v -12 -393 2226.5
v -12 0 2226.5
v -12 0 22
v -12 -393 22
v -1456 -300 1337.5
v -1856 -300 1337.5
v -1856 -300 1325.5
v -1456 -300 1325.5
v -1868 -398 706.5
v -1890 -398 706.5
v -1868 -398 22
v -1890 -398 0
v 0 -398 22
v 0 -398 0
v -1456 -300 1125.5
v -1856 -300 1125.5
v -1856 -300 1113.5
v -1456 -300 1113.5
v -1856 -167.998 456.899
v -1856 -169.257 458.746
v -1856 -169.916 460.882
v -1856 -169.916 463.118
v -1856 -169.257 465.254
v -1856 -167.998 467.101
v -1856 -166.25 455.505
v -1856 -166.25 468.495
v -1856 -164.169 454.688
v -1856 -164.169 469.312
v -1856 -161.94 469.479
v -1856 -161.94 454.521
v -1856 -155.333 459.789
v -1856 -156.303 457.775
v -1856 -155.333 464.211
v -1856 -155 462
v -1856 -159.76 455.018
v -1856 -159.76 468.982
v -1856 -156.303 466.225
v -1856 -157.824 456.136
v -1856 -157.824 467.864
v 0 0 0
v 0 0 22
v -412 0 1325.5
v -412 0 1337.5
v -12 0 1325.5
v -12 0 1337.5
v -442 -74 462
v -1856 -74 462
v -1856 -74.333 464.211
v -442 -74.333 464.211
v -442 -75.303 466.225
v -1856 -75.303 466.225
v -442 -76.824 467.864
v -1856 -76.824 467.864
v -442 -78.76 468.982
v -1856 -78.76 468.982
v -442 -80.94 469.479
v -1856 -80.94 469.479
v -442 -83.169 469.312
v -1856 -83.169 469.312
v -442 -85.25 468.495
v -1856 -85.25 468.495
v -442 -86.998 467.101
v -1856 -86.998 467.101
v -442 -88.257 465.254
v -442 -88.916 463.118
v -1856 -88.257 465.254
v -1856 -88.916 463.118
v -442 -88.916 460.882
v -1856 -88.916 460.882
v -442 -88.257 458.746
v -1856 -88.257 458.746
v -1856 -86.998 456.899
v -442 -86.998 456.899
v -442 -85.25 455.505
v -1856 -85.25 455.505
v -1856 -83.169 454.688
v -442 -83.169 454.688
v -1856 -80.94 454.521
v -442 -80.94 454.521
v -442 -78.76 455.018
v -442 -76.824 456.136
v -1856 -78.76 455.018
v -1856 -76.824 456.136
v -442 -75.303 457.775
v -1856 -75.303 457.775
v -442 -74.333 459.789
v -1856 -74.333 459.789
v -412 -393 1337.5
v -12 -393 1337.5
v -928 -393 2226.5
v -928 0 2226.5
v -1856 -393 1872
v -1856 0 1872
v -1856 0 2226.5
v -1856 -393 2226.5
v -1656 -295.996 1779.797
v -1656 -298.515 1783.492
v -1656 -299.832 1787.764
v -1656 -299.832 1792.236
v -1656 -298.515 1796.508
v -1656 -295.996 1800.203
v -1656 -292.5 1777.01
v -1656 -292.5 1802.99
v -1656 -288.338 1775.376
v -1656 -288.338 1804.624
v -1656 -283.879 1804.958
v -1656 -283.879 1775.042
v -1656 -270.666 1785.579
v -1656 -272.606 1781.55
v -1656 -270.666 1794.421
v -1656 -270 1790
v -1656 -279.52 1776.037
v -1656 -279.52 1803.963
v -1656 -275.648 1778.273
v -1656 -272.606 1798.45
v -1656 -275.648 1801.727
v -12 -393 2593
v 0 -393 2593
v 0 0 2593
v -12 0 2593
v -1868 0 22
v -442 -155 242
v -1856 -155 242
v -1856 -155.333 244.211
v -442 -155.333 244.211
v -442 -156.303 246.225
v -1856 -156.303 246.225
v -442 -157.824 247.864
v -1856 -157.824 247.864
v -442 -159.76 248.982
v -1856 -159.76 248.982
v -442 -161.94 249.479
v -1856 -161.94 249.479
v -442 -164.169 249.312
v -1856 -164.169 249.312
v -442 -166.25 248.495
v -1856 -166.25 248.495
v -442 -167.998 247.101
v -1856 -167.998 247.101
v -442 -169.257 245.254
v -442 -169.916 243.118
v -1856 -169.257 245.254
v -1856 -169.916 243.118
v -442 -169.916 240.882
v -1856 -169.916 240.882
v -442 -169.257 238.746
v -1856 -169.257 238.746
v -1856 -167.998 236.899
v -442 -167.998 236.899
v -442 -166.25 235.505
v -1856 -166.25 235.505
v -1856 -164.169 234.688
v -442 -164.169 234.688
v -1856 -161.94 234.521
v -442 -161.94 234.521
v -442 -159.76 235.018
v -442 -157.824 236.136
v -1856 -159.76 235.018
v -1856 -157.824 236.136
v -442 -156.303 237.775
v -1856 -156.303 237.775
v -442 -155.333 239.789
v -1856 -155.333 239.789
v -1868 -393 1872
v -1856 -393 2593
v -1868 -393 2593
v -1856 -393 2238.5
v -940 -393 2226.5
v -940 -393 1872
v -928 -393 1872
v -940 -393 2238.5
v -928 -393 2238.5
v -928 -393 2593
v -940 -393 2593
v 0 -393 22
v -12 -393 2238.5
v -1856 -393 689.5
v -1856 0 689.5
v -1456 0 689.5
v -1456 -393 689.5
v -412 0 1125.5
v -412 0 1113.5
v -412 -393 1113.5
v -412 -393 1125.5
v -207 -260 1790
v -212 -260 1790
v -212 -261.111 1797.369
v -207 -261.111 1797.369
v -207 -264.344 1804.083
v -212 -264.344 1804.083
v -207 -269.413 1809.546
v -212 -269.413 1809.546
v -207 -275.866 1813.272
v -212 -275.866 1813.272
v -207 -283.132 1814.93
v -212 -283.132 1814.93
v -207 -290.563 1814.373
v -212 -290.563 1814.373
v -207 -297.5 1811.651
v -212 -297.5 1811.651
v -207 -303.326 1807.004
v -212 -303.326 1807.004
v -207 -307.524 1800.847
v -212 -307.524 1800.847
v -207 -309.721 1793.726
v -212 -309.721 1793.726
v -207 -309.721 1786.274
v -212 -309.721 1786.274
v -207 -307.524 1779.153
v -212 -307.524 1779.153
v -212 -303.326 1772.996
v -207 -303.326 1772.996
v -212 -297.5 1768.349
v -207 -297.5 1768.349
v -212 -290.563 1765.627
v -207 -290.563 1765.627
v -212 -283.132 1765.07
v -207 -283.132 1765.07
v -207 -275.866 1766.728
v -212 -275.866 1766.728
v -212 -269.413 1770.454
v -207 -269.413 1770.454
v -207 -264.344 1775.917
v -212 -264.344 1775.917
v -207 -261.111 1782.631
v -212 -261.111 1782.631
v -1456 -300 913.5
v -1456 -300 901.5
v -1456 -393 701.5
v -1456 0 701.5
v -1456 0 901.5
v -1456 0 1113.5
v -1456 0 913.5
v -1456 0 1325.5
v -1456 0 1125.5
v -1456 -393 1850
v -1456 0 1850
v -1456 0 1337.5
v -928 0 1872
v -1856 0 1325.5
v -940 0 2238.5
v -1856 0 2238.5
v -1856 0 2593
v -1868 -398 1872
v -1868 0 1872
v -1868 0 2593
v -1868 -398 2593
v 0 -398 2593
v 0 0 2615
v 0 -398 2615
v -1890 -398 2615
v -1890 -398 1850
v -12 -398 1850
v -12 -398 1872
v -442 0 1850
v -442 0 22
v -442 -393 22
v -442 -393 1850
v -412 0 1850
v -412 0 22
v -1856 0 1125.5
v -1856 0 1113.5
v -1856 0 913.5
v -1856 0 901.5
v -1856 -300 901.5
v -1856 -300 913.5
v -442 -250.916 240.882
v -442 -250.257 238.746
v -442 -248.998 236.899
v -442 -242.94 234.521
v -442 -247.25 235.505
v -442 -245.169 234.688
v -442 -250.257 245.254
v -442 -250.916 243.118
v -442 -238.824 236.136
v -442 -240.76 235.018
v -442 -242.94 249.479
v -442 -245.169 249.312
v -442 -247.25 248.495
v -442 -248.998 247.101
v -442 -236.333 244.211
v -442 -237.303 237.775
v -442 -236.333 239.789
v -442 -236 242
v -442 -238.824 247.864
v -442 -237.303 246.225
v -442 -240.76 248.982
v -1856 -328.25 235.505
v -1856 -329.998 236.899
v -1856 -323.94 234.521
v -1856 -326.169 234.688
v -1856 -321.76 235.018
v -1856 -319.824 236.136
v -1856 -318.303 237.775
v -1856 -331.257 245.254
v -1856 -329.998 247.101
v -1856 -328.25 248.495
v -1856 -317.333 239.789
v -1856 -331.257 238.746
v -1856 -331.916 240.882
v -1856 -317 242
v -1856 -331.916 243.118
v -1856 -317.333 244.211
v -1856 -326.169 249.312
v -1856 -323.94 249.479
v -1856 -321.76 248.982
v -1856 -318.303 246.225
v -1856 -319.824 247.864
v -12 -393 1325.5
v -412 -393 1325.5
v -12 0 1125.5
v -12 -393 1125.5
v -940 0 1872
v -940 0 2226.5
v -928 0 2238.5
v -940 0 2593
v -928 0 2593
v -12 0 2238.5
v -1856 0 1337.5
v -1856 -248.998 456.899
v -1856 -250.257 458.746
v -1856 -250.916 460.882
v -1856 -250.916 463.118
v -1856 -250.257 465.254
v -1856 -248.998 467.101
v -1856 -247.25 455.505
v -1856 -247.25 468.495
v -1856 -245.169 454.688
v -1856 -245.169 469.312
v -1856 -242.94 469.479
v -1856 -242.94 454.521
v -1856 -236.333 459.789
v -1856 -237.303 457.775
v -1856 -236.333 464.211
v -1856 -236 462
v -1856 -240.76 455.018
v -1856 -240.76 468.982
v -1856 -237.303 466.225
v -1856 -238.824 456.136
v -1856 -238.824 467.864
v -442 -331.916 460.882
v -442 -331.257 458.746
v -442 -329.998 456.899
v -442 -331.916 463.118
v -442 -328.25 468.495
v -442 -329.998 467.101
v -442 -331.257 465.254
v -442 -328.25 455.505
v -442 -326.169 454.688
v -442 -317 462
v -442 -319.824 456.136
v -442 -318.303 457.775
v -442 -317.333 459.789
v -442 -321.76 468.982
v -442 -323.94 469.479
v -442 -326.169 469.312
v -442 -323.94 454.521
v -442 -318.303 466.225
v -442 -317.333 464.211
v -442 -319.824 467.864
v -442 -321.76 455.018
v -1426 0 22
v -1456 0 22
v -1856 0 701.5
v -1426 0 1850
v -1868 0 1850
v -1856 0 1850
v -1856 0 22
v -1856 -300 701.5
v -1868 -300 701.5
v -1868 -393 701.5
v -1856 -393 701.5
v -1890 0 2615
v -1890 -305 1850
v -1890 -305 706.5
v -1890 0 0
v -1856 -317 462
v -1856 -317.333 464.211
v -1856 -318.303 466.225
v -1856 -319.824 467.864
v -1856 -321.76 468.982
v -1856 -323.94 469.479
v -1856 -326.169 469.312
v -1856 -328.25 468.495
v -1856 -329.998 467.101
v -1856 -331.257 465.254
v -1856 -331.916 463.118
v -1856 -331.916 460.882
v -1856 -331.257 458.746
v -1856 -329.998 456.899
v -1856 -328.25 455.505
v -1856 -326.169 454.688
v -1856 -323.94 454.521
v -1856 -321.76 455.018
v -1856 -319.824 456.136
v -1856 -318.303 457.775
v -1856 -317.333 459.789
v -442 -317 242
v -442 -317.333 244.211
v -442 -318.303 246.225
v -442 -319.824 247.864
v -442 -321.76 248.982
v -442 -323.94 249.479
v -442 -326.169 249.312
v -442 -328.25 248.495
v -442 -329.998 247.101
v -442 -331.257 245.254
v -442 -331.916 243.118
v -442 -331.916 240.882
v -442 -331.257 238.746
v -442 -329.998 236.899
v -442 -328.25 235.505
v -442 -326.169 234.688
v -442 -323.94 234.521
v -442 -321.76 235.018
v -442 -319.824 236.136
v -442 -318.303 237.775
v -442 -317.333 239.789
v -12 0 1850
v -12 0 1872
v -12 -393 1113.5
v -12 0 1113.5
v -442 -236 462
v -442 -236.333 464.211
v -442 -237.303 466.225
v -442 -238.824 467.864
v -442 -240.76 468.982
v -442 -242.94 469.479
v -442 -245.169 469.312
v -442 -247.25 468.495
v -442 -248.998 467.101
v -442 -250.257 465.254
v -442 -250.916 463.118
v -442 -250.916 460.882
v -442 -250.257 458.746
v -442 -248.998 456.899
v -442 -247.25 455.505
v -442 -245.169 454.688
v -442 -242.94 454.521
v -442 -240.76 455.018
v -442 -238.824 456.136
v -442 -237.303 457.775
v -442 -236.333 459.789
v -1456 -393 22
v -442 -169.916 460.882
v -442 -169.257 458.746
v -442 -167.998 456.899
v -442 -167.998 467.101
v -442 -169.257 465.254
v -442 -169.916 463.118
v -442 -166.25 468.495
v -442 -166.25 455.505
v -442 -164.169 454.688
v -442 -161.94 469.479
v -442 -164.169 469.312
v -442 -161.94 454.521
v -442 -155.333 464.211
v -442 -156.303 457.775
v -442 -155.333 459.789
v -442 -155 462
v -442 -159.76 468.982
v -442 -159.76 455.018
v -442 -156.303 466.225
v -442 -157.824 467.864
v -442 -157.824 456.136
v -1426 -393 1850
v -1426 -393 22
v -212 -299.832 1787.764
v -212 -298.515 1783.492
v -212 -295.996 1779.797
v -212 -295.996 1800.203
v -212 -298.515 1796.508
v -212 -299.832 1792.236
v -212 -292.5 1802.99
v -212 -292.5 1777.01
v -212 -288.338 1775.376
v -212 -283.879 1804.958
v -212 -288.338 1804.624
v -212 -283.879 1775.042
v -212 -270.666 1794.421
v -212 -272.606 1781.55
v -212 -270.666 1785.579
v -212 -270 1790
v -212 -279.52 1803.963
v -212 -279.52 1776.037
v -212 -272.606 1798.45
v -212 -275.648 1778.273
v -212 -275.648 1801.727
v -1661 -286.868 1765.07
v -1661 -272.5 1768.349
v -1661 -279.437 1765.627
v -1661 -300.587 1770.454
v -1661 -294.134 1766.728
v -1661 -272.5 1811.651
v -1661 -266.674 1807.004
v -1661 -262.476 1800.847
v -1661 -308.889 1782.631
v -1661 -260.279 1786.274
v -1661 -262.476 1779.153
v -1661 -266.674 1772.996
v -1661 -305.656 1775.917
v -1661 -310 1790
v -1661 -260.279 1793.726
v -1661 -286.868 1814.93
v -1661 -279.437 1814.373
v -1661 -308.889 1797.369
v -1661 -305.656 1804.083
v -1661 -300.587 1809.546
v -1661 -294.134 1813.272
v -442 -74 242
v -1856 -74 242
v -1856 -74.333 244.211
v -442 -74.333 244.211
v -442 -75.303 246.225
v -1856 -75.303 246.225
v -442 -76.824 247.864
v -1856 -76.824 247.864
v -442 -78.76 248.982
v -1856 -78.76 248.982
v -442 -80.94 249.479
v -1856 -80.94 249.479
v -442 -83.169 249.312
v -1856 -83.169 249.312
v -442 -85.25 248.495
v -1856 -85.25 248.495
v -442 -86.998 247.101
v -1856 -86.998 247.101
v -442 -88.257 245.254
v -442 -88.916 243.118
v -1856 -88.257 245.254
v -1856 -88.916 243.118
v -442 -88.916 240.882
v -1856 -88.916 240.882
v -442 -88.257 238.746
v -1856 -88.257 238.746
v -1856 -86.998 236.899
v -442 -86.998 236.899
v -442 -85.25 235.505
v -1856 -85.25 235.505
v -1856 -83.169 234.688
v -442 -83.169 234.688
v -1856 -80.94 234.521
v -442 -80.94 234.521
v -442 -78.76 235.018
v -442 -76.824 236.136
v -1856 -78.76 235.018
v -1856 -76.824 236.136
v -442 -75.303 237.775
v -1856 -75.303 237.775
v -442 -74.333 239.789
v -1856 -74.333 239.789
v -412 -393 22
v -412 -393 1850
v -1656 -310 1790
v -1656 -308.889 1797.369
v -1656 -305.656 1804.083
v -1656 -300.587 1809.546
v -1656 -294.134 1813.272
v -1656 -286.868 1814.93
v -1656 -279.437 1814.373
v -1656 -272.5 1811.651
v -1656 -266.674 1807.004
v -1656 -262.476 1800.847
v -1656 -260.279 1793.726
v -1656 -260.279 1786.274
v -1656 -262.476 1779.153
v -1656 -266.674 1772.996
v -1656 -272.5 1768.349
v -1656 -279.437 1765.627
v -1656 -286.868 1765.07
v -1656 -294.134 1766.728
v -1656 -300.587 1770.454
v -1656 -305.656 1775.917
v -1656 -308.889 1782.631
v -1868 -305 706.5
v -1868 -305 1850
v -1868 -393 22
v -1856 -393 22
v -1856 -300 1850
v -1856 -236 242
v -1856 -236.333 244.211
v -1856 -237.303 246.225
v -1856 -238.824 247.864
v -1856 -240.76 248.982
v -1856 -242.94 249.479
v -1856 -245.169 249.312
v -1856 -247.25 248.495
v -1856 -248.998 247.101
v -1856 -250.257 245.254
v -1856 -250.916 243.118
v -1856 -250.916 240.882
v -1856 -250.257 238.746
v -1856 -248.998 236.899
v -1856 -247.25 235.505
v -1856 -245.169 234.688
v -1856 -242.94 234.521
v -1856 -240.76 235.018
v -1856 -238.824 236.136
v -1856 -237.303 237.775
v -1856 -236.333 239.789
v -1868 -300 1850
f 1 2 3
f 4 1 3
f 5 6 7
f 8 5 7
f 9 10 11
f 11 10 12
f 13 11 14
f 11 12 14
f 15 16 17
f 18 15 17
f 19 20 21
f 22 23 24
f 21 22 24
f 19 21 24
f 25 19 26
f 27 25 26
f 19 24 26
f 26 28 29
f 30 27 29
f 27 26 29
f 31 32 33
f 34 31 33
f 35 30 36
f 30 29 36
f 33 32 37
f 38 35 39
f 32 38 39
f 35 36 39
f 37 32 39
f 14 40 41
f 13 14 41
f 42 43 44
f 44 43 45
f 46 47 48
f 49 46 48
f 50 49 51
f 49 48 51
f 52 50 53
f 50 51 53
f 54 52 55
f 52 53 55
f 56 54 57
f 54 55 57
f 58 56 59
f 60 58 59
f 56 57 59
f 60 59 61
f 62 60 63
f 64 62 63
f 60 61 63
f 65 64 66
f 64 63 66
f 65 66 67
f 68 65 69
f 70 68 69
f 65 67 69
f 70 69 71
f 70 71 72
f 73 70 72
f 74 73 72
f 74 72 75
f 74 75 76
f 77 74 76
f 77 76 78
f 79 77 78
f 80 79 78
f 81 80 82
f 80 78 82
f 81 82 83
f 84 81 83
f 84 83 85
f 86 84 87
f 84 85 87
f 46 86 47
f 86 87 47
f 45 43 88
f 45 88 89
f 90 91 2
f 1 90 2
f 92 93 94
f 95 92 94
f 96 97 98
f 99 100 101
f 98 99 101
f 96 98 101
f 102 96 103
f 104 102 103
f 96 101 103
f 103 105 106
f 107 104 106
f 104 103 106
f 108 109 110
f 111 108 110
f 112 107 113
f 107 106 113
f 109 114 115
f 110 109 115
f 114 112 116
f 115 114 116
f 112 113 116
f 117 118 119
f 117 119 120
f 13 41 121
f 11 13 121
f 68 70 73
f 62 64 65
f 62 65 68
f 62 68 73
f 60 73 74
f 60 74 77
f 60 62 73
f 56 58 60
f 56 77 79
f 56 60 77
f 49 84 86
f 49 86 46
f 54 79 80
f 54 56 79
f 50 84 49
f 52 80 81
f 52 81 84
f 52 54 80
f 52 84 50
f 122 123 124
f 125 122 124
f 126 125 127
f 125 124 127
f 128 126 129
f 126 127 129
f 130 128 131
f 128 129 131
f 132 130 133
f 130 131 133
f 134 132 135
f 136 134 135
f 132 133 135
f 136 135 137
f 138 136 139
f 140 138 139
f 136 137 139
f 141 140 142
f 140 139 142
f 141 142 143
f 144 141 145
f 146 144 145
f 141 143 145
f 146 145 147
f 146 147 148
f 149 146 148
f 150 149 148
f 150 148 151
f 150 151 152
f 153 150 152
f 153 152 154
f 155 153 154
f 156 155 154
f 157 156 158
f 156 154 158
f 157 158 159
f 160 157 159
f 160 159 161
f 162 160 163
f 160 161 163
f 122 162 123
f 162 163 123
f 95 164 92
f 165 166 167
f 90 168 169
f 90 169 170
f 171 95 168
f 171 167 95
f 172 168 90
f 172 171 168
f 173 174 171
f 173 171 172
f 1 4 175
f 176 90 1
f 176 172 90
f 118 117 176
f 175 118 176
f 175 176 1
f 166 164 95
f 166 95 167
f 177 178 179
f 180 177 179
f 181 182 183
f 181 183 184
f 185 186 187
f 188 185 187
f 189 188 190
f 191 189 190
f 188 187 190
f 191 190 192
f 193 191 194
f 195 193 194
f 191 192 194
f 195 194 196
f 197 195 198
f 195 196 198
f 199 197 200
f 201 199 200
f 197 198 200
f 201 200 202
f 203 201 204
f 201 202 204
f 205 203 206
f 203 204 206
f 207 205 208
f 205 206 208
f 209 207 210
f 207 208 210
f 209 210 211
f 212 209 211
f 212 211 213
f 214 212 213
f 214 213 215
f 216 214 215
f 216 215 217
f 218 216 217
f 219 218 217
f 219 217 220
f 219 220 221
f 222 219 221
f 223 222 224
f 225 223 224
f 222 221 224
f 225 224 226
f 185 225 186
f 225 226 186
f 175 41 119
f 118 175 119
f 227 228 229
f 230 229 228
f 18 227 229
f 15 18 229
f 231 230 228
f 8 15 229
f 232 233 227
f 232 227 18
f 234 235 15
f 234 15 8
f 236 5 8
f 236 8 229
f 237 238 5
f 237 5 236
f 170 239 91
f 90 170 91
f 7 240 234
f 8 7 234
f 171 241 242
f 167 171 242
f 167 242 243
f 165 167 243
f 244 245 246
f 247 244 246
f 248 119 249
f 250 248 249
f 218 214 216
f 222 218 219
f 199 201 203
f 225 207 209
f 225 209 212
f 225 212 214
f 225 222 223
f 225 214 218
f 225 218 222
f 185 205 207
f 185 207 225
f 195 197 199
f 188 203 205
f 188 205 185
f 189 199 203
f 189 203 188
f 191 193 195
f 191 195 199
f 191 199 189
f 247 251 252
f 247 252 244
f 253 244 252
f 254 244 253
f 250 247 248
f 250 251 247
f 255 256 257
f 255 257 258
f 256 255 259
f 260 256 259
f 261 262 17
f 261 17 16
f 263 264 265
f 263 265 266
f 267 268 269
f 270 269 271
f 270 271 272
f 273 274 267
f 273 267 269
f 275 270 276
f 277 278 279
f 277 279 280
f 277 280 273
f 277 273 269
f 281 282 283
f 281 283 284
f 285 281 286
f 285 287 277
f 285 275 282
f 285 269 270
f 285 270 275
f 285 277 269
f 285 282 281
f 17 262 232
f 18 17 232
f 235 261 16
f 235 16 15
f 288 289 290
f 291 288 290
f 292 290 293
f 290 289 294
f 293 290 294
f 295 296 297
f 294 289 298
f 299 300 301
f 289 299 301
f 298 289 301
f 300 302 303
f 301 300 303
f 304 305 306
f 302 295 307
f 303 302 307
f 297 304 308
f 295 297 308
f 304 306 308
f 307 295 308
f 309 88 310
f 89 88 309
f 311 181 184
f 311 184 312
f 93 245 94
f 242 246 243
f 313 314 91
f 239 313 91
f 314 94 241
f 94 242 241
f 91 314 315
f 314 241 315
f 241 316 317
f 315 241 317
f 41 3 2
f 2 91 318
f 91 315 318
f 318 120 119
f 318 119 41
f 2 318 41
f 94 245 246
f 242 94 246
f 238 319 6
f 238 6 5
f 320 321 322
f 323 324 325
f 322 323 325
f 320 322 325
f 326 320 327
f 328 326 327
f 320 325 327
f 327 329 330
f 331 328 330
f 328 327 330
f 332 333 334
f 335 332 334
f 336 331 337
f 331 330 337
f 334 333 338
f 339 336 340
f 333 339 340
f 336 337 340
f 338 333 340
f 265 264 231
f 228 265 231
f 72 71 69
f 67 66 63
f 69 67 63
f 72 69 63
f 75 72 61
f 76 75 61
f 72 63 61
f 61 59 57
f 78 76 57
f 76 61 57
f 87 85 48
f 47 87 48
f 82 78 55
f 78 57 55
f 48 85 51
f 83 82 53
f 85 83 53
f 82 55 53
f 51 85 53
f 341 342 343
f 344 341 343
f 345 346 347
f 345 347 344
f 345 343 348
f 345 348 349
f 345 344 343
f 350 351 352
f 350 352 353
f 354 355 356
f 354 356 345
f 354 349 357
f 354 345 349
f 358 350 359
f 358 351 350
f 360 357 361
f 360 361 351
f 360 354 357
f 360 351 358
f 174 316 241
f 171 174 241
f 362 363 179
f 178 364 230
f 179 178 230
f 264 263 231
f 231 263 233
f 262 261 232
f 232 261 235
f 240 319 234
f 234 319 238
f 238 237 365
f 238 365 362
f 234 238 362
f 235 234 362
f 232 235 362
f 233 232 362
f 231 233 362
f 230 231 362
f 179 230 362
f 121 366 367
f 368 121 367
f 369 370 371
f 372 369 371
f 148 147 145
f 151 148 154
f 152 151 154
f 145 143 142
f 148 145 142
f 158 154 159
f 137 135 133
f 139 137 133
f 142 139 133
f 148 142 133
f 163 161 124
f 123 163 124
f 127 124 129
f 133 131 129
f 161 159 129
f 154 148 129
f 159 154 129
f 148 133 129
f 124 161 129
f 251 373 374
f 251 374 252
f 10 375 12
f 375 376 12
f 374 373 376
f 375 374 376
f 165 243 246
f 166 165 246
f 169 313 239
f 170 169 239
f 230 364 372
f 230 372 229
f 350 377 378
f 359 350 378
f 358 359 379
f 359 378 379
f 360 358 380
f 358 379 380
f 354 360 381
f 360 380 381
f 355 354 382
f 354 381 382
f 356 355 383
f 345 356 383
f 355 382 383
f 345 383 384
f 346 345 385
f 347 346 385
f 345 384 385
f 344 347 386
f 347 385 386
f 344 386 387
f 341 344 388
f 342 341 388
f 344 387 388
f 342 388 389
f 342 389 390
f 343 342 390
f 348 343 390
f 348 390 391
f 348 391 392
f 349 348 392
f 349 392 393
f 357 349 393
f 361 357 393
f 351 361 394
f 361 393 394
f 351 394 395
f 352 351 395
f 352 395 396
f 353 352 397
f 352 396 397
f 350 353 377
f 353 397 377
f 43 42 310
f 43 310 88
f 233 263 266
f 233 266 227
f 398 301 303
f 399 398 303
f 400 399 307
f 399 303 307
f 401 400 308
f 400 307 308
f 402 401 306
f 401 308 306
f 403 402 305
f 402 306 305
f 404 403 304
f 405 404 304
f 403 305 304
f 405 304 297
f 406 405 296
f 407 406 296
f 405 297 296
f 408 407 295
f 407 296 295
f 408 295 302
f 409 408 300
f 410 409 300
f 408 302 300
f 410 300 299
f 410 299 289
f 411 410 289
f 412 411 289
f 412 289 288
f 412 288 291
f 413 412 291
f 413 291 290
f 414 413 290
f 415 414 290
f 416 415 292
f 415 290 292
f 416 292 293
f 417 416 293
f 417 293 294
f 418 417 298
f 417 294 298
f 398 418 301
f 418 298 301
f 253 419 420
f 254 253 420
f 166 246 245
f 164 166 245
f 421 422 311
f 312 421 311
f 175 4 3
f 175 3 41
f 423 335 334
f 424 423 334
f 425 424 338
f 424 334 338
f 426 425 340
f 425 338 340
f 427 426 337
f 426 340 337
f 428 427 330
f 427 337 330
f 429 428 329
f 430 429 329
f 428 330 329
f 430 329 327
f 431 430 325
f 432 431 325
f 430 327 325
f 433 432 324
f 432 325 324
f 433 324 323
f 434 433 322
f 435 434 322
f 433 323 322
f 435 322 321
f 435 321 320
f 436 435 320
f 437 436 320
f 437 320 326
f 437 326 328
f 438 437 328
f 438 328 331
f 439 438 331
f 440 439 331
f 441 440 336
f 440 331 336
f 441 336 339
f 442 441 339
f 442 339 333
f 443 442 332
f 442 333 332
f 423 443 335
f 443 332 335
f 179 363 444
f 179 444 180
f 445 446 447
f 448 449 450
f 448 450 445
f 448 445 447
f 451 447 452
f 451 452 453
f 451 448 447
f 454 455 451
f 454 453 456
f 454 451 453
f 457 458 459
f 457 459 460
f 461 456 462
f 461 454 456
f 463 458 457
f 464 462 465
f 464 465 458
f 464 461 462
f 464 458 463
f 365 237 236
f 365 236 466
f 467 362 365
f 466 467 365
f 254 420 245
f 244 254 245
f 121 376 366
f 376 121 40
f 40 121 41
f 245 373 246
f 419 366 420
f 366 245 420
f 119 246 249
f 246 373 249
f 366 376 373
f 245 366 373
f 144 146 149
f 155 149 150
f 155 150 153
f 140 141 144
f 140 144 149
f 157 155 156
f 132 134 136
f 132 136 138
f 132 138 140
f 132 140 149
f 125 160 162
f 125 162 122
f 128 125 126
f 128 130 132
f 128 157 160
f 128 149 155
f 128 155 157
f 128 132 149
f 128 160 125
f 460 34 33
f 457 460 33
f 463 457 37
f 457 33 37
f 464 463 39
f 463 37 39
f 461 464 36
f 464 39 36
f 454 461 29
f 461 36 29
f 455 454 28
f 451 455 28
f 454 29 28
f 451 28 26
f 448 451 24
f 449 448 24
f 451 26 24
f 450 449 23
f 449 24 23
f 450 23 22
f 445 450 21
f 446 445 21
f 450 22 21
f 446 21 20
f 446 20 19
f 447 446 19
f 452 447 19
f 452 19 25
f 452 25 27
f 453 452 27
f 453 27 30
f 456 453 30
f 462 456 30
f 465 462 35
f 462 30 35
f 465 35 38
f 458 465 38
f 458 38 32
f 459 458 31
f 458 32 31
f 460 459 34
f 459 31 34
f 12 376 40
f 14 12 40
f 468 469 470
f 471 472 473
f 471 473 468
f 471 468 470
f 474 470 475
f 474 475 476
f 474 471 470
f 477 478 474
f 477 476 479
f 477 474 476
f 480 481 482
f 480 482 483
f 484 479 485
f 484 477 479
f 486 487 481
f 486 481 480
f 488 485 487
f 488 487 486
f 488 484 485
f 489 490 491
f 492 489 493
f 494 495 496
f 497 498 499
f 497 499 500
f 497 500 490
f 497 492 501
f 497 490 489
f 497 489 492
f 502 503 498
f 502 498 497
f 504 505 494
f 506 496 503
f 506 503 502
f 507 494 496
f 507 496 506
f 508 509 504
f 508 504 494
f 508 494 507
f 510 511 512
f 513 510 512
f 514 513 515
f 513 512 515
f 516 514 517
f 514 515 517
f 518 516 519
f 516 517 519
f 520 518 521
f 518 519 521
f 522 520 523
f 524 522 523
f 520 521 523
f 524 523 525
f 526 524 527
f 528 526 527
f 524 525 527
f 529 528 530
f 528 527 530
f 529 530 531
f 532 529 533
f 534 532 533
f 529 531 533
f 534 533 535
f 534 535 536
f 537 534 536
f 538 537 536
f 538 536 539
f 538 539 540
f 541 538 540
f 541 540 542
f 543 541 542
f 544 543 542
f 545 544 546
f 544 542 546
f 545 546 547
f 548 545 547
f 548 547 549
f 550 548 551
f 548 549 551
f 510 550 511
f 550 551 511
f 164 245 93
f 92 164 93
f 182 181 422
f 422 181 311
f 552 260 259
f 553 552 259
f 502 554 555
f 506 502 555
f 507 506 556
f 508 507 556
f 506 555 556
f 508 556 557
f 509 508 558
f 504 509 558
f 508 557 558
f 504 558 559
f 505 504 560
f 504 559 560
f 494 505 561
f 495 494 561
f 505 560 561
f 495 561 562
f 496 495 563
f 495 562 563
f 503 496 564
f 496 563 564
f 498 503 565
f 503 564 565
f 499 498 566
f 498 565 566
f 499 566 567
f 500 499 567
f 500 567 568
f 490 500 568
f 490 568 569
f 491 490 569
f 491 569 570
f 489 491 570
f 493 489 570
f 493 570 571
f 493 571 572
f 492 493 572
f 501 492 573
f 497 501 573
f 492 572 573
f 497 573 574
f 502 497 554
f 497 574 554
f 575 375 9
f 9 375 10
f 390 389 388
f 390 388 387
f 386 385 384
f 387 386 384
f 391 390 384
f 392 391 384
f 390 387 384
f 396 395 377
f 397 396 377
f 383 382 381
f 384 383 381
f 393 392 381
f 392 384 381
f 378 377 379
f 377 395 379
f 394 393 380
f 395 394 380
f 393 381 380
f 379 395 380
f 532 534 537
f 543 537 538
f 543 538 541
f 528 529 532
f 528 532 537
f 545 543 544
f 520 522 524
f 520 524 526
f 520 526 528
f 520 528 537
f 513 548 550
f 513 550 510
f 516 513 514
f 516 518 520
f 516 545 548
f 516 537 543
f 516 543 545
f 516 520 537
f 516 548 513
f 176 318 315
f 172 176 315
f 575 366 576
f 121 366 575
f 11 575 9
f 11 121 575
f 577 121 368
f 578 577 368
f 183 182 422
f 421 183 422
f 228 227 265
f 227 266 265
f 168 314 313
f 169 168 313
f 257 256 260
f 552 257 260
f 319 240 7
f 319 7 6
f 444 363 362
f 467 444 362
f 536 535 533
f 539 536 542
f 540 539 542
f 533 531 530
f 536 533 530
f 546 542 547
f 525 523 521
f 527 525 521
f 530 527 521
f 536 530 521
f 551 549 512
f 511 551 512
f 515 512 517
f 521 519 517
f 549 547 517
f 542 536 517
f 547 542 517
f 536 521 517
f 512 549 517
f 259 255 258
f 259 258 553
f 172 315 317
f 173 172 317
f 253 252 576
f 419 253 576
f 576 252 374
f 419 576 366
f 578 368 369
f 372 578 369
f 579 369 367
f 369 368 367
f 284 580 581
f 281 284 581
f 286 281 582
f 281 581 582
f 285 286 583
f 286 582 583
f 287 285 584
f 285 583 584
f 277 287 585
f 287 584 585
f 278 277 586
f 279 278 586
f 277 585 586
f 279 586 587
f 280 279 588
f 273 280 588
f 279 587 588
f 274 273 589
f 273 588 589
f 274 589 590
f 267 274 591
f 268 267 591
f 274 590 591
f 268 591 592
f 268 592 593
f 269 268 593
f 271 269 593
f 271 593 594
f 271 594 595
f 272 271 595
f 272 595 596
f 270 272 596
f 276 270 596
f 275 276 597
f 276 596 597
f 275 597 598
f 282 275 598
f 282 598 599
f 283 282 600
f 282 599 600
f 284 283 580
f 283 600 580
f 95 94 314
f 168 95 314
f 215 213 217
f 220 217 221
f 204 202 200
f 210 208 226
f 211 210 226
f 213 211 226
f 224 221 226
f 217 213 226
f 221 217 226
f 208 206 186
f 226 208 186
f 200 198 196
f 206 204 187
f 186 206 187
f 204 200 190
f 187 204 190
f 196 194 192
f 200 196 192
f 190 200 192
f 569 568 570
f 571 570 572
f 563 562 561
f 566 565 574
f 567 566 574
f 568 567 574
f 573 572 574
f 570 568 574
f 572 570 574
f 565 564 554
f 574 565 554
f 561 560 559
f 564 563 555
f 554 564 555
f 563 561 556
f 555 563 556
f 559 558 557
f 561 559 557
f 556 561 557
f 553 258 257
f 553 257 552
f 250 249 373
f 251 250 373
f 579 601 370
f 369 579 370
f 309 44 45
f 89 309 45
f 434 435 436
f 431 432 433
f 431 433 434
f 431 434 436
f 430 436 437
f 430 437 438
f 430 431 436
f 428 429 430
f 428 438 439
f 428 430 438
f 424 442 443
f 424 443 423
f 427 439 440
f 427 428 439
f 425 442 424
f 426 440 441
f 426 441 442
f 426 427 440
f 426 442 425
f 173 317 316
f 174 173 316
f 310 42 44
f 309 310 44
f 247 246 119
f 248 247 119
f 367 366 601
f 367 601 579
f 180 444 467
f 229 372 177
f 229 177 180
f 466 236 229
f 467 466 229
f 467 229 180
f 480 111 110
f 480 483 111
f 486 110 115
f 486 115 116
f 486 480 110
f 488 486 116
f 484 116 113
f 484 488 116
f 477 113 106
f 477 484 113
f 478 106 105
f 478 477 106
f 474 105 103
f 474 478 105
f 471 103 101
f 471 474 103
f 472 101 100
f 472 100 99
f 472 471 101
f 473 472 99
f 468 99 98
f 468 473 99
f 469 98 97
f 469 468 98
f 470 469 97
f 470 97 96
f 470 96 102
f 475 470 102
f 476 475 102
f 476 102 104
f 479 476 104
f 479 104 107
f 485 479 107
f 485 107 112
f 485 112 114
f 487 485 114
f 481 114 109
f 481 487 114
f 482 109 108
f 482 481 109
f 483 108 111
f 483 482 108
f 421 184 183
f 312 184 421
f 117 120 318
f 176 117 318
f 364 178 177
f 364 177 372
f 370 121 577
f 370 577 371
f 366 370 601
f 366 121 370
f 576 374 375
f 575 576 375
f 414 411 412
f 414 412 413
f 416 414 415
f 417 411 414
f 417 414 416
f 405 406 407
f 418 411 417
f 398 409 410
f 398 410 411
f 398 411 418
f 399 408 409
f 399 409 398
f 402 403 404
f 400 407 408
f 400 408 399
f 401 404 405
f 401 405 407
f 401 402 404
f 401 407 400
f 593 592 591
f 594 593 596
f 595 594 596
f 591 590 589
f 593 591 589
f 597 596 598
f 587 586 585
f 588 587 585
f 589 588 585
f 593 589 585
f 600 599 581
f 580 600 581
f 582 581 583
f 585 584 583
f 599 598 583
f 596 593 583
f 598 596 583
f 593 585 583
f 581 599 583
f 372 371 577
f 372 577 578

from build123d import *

# Parameters (mm, degrees)
F1_DEPTH       = 398
F0_W           = 30
F0_H           = 1828
F2_DEPTH       = 393
F0_W_2         = 12
F3_R           = 7.5
F4_DEPTH       = 1414
F5_W           = 400
F5_H           = 12
F6_DEPTH       = 393
F8_DEPTH       = 434
F9_DEPTH       = 5
F10_DEPTH      = 5
F11_R          = 15
F12_DEPTH      = 1214
F12_DEPTH_BACK = 230
F13_R          = 25
F13_R_2        = 15
F14_DEPTH      = 5
F15_R          = 25
F15_R_2        = 15
F16_DEPTH      = 5


with BuildPart() as f1:
    # F0 (on Front) → F1 (new body)
    with BuildSketch(Plane.XZ):
        Polygon((-1890, 0), (0, 0), (0, 22), (-12, 22), (-412, 22), (-442, 22), (-1426, 22), (-1456, 22), (-1856, 22), (-1868, 22), (-1868, 1850), (-1856, 1850), (-1456, 1850), (-1426, 1850), (-442, 1850), (-412, 1850), (-12, 1850), (-12, 1872), (-928, 1872), (-940, 1872), (-1856, 1872), (-1868, 1872), (-1868, 2593), (-1856, 2593), (-940, 2593), (-928, 2593), (-12, 2593), (0, 2593), (0, 2615), (-1890, 2615), align=None)
    extrude(amount=F1_DEPTH)


with BuildPart() as f2:
    # F0 (on Front) → F2 (new body, through all)
    with BuildSketch(Plane.XZ):
        with Locations((-1441, 936)):
            Rectangle(F0_W, F0_H)
    extrude(amount=F2_DEPTH)

    # F5 (on Front) → F6 (join, through all)
    with BuildSketch(Plane.XZ):
        with Locations((-1656, 1331.5)):
            Rectangle(F5_W, F5_H)
        with Locations((-1656, 1119.5)):
            Rectangle(F5_W, F5_H)
        with Locations((-1656, 907.5)):
            Rectangle(F5_W, F5_H)
        with Locations((-1656, 695.5)):
            Rectangle(F5_W, F5_H)
    extrude(amount=F6_DEPTH)


with BuildPart() as f2b:
    # F0 (on Front) → F2, piece 2 (new body, through all)
    with BuildSketch(Plane.XZ):
        with Locations((-427, 936)):
            Rectangle(F0_W, F0_H)
    extrude(amount=F2_DEPTH)


with BuildPart() as f2c:
    # F0 (on Front) → F2, piece 3 (new body, through all)
    with BuildSketch(Plane.XZ):
        Polygon((-12, 22), (0, 22), (0, 2593), (-12, 2593), (-12, 2238.5), (-928, 2238.5), (-928, 2593), (-940, 2593), (-940, 2238.5), (-1856, 2238.5), (-1856, 2593), (-1868, 2593), (-1868, 1872), (-1856, 1872), (-1856, 2226.5), (-940, 2226.5), (-940, 1872), (-928, 1872), (-928, 2226.5), (-12, 2226.5), (-12, 1872), (-12, 1850), align=None)
    extrude(amount=F2_DEPTH)


with BuildPart() as f2d:
    # F0 (on Front) → F2, piece 4 (new body, through all)
    with BuildSketch(Plane.XZ):
        with Locations((-1862, 936)):
            Rectangle(F0_W_2, F0_H)
    extrude(amount=F2_DEPTH)


with BuildPart() as f4:
    # F3 (on face) → F4 (new body, through all)
    with BuildSketch(Plane.YZ.offset(-1856)):
        with Locations((-324.5, 242)):
            Circle(F3_R)
    extrude(amount=F4_DEPTH)


with BuildPart() as f4b:
    # F3 (on face) → F4, piece 2 (new body, through all)
    with BuildSketch(Plane.YZ.offset(-1856)):
        with Locations((-324.5, 462)):
            Circle(F3_R)
    extrude(amount=F4_DEPTH)


with BuildPart() as f4c:
    # F3 (on face) → F4, piece 3 (new body, through all)
    with BuildSketch(Plane.YZ.offset(-1856)):
        with Locations((-243.5, 242)):
            Circle(F3_R)
    extrude(amount=F4_DEPTH)


with BuildPart() as f4d:
    # F3 (on face) → F4, piece 4 (new body, through all)
    with BuildSketch(Plane.YZ.offset(-1856)):
        with Locations((-243.5, 462)):
            Circle(F3_R)
    extrude(amount=F4_DEPTH)


with BuildPart() as f4e:
    # F3 (on face) → F4, piece 5 (new body, through all)
    with BuildSketch(Plane.YZ.offset(-1856)):
        with Locations((-162.5, 242)):
            Circle(F3_R)
    extrude(amount=F4_DEPTH)


with BuildPart() as f4f:
    # F3 (on face) → F4, piece 6 (new body, through all)
    with BuildSketch(Plane.YZ.offset(-1856)):
        with Locations((-162.5, 462)):
            Circle(F3_R)
    extrude(amount=F4_DEPTH)


with BuildPart() as f4g:
    # F3 (on face) → F4, piece 7 (new body, through all)
    with BuildSketch(Plane.YZ.offset(-1856)):
        with Locations((-81.5, 242)):
            Circle(F3_R)
    extrude(amount=F4_DEPTH)


with BuildPart() as f4h:
    # F3 (on face) → F4, piece 8 (new body, through all)
    with BuildSketch(Plane.YZ.offset(-1856)):
        with Locations((-81.5, 462)):
            Circle(F3_R)
    extrude(amount=F4_DEPTH)


with BuildPart() as f6:
    # F5 (on Front) → F6, piece 2 (new body, through all)
    with BuildSketch(Plane.XZ):
        with Locations((-212, 1331.5)):
            Rectangle(F5_W, F5_H)
    extrude(amount=F6_DEPTH)


with BuildPart() as f6b:
    # F5 (on Front) → F6, piece 3 (new body, through all)
    with BuildSketch(Plane.XZ):
        with Locations((-212, 1119.5)):
            Rectangle(F5_W, F5_H)
    extrude(amount=F6_DEPTH)


with BuildPart() as f8_tool:
    # F7 (on face) → F8 (new body, through all)
    with BuildSketch(Plane(origin=(-1890, 0, 0), x_dir=(0, -1, 0), z_dir=(-1, 0, 0))):
        Polygon((964.3889665604, 701.5), (976.9414663315, 1850), (300, 1850), (300, 701.5), align=None)
    extrude(amount=-F8_DEPTH)


with BuildPart() as f1_1:
    add(f1.part)

    # F8: cut by f8_tool
    add(f8_tool.part, mode=Mode.SUBTRACT)

    # F9 (add): a face of the model
    f9_faces = [f1_1.faces().sort_by_distance(p)[0] for p in [
        (-1879, -300, 1275.75),
    ]]
    extrude(f9_faces, amount=F9_DEPTH)

    # F10 (add): a face of the model
    f10_faces = [f1_1.faces().sort_by_distance(p)[0] for p in [
        (-1879, -351.5, 701.5),
    ]]
    extrude(f10_faces, amount=F10_DEPTH)


with BuildPart() as f2_1:
    add(f2.part)

    # F8: cut by f8_tool
    add(f8_tool.part, mode=Mode.SUBTRACT)


with BuildPart() as f2d_1:
    add(f2d.part)

    # F8: cut by f8_tool
    add(f8_tool.part, mode=Mode.SUBTRACT)


with BuildPart() as f12:
    # F11 (on face) → F12 (new body, two sides)
    with BuildSketch(Plane.YZ.offset(-1426)) as f12_sk:
        with Locations((-285, 1790)):
            Circle(F11_R)
    extrude(amount=F12_DEPTH)
    extrude(f12_sk.sketch, amount=-F12_DEPTH_BACK)


with BuildPart() as f14:
    # F13 (on face) → F14 (new body)
    with BuildSketch(Plane(origin=(-1656, 0, 0), x_dir=(0, -1, 0), z_dir=(-1, 0, 0))):
        with Locations((285, 1790)):
            Circle(F13_R)
        with Locations((285, 1790)):
            Circle(F13_R_2, mode=Mode.SUBTRACT)
        with Locations((285, 1790)):
            Circle(F13_R_2)
    extrude(amount=F14_DEPTH)


with BuildPart() as f16:
    # F15 (on face) → F16 (new body)
    with BuildSketch(Plane.YZ.offset(-212)):
        with Locations((-285, 1790)):
            Circle(F15_R)
        with Locations((-285, 1790)):
            Circle(F15_R_2, mode=Mode.SUBTRACT)
        with Locations((-285, 1790)):
            Circle(F15_R_2)
    extrude(amount=F16_DEPTH)


solid = Compound([f2b.part, f2c.part, f4.part, f4b.part, f4c.part, f4d.part, f4e.part, f4f.part, f4g.part, f4h.part, f6.part, f6b.part, f1_1.part, f2_1.part, f2d_1.part, f12.part, f14.part, f16.part])
